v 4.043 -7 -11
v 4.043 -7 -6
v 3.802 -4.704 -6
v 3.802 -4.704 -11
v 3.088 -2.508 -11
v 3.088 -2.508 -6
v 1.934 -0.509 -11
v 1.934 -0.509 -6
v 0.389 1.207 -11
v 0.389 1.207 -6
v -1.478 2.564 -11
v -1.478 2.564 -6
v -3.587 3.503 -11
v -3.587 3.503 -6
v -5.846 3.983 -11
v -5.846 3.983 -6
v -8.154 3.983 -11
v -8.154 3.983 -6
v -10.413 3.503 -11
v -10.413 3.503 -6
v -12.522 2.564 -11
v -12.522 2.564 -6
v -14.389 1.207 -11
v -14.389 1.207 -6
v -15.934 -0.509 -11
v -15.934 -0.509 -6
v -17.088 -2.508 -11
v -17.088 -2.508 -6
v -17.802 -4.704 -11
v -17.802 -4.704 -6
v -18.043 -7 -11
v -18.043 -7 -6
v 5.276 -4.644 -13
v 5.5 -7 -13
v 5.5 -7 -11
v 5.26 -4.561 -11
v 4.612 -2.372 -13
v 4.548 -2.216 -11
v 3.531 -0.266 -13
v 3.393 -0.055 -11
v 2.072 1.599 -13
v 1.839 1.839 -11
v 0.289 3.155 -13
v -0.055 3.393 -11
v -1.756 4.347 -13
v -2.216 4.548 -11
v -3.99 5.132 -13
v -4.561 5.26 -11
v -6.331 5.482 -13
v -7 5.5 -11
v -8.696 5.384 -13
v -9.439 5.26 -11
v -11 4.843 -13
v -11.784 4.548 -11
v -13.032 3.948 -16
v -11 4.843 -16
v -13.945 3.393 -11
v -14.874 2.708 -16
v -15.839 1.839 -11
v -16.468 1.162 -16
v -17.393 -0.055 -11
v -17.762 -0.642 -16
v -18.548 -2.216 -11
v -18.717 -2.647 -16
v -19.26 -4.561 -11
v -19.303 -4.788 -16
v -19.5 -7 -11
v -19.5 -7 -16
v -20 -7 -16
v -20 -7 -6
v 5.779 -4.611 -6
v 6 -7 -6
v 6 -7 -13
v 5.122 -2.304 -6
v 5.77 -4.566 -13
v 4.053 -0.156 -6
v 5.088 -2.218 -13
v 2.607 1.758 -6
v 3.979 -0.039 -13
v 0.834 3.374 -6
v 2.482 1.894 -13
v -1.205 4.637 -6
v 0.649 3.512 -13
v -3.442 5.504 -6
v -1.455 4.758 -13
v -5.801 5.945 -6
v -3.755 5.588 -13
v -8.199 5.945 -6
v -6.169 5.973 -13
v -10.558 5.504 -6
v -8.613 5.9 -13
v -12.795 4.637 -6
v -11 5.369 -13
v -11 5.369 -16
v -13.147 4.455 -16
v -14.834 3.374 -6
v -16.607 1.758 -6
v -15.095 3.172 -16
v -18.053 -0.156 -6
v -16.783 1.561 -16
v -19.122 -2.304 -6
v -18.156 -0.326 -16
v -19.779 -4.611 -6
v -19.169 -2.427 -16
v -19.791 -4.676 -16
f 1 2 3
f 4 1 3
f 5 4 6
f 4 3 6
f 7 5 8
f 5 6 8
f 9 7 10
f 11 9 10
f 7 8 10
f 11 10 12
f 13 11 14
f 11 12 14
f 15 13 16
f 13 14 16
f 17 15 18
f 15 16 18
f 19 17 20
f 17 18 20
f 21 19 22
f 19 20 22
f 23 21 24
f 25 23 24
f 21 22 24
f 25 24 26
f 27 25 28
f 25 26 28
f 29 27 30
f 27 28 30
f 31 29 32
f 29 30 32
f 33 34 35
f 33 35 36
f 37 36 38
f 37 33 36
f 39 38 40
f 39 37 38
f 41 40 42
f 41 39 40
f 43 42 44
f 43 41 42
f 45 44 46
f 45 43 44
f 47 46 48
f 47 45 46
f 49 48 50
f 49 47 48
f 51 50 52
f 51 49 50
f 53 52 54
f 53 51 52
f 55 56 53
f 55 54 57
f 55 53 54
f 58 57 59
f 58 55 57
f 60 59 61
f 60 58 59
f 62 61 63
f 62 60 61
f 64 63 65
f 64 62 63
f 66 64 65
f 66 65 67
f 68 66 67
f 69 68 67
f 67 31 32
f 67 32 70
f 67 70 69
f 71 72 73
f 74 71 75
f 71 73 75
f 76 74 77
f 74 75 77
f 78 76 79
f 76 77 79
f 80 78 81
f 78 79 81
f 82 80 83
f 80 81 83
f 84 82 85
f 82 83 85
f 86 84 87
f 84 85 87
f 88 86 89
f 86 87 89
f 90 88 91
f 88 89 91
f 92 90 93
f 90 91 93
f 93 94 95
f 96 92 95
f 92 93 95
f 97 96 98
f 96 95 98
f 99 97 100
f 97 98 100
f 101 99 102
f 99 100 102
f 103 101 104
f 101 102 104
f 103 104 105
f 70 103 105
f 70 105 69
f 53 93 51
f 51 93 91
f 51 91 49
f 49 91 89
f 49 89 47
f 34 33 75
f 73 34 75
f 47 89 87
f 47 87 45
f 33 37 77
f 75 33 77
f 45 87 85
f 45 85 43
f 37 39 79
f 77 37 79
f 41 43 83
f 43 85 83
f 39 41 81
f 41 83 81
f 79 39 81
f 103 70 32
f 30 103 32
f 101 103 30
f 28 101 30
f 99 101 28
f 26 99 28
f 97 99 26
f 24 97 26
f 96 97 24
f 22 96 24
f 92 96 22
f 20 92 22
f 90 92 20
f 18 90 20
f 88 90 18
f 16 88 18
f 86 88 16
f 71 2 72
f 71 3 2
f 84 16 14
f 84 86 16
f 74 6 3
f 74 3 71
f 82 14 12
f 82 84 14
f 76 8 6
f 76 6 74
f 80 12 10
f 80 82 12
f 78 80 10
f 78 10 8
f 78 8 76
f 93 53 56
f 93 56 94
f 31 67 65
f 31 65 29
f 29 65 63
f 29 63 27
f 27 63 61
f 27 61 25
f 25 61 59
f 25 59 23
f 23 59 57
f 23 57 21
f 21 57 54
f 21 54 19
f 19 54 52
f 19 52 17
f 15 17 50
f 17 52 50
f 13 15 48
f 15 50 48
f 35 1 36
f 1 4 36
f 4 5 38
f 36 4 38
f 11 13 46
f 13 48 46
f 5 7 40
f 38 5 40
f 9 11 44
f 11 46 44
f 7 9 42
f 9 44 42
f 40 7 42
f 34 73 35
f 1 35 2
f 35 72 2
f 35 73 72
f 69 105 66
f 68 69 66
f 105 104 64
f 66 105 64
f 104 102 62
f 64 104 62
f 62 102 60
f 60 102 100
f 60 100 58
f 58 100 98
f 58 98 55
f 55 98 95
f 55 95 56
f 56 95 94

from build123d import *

# Parameters (mm, degrees)
BOX004_W           = 19
BOX004_H           = 20
BOX004_DEPTH       = 4
CYLINDER002_R      = 12.5
CYLINDER002_DEPTH  = 5
CYLINDER001_R      = 13
CYLINDER001_DEPTH  = 10
POCKET004012_DEPTH = 10


with BuildPart() as box004:
    # Box004 → Box004 (new body)
    with BuildSketch(Plane(origin=(-11, -12, -17), x_dir=(1, 0, 0), z_dir=(0, 0, 1))):
        with Locations((9.5, 10)):
            Rectangle(BOX004_W, BOX004_H)
    extrude(amount=BOX004_DEPTH)


with BuildPart() as cylinder002:
    # Cylinder002 → Cylinder002 (new body)
    with BuildSketch(Plane(origin=(-7, -7, -16), x_dir=(1, 0, 0), z_dir=(0, 0, 1))):
        Circle(CYLINDER002_R)
    extrude(amount=CYLINDER002_DEPTH)


with BuildPart() as cut002:
    # Cylinder001 → Cylinder001 (new body)
    with BuildSketch(Plane(origin=(-7, -7, -16), x_dir=(1, 0, 0), z_dir=(0, 0, 1))):
        Circle(CYLINDER001_R)
    extrude(amount=CYLINDER001_DEPTH)

    # Sketch020 → Pocket004012 (cut)
    with BuildSketch(Plane(origin=(-7, -7, -6), x_dir=(1, 0, 0), z_dir=(0, 0, 1))):
        with BuildLine():
            ThreePointArc((11.043126, 0), (0, 11.043126), (-11.043126, 0))
            Line((-11.043126, 0), (-15.353921, 0))
            Line((-15.353921, 0), (-15.353921, -14.225527))
            Line((-15.353921, -14.225527), (14.925669, -14.225527))
            Line((14.925669, -14.225527), (14.925669, 0))
            Line((14.925669, 0), (11.043126, 0))
        make_face()
    extrude(amount=-POCKET004012_DEPTH, mode=Mode.SUBTRACT)

    # Cut001: cut Cylinder002
    add(cylinder002.part, mode=Mode.SUBTRACT)

    # Cut002: cut Box004
    add(box004.part, mode=Mode.SUBTRACT)


solid = cut002.part
